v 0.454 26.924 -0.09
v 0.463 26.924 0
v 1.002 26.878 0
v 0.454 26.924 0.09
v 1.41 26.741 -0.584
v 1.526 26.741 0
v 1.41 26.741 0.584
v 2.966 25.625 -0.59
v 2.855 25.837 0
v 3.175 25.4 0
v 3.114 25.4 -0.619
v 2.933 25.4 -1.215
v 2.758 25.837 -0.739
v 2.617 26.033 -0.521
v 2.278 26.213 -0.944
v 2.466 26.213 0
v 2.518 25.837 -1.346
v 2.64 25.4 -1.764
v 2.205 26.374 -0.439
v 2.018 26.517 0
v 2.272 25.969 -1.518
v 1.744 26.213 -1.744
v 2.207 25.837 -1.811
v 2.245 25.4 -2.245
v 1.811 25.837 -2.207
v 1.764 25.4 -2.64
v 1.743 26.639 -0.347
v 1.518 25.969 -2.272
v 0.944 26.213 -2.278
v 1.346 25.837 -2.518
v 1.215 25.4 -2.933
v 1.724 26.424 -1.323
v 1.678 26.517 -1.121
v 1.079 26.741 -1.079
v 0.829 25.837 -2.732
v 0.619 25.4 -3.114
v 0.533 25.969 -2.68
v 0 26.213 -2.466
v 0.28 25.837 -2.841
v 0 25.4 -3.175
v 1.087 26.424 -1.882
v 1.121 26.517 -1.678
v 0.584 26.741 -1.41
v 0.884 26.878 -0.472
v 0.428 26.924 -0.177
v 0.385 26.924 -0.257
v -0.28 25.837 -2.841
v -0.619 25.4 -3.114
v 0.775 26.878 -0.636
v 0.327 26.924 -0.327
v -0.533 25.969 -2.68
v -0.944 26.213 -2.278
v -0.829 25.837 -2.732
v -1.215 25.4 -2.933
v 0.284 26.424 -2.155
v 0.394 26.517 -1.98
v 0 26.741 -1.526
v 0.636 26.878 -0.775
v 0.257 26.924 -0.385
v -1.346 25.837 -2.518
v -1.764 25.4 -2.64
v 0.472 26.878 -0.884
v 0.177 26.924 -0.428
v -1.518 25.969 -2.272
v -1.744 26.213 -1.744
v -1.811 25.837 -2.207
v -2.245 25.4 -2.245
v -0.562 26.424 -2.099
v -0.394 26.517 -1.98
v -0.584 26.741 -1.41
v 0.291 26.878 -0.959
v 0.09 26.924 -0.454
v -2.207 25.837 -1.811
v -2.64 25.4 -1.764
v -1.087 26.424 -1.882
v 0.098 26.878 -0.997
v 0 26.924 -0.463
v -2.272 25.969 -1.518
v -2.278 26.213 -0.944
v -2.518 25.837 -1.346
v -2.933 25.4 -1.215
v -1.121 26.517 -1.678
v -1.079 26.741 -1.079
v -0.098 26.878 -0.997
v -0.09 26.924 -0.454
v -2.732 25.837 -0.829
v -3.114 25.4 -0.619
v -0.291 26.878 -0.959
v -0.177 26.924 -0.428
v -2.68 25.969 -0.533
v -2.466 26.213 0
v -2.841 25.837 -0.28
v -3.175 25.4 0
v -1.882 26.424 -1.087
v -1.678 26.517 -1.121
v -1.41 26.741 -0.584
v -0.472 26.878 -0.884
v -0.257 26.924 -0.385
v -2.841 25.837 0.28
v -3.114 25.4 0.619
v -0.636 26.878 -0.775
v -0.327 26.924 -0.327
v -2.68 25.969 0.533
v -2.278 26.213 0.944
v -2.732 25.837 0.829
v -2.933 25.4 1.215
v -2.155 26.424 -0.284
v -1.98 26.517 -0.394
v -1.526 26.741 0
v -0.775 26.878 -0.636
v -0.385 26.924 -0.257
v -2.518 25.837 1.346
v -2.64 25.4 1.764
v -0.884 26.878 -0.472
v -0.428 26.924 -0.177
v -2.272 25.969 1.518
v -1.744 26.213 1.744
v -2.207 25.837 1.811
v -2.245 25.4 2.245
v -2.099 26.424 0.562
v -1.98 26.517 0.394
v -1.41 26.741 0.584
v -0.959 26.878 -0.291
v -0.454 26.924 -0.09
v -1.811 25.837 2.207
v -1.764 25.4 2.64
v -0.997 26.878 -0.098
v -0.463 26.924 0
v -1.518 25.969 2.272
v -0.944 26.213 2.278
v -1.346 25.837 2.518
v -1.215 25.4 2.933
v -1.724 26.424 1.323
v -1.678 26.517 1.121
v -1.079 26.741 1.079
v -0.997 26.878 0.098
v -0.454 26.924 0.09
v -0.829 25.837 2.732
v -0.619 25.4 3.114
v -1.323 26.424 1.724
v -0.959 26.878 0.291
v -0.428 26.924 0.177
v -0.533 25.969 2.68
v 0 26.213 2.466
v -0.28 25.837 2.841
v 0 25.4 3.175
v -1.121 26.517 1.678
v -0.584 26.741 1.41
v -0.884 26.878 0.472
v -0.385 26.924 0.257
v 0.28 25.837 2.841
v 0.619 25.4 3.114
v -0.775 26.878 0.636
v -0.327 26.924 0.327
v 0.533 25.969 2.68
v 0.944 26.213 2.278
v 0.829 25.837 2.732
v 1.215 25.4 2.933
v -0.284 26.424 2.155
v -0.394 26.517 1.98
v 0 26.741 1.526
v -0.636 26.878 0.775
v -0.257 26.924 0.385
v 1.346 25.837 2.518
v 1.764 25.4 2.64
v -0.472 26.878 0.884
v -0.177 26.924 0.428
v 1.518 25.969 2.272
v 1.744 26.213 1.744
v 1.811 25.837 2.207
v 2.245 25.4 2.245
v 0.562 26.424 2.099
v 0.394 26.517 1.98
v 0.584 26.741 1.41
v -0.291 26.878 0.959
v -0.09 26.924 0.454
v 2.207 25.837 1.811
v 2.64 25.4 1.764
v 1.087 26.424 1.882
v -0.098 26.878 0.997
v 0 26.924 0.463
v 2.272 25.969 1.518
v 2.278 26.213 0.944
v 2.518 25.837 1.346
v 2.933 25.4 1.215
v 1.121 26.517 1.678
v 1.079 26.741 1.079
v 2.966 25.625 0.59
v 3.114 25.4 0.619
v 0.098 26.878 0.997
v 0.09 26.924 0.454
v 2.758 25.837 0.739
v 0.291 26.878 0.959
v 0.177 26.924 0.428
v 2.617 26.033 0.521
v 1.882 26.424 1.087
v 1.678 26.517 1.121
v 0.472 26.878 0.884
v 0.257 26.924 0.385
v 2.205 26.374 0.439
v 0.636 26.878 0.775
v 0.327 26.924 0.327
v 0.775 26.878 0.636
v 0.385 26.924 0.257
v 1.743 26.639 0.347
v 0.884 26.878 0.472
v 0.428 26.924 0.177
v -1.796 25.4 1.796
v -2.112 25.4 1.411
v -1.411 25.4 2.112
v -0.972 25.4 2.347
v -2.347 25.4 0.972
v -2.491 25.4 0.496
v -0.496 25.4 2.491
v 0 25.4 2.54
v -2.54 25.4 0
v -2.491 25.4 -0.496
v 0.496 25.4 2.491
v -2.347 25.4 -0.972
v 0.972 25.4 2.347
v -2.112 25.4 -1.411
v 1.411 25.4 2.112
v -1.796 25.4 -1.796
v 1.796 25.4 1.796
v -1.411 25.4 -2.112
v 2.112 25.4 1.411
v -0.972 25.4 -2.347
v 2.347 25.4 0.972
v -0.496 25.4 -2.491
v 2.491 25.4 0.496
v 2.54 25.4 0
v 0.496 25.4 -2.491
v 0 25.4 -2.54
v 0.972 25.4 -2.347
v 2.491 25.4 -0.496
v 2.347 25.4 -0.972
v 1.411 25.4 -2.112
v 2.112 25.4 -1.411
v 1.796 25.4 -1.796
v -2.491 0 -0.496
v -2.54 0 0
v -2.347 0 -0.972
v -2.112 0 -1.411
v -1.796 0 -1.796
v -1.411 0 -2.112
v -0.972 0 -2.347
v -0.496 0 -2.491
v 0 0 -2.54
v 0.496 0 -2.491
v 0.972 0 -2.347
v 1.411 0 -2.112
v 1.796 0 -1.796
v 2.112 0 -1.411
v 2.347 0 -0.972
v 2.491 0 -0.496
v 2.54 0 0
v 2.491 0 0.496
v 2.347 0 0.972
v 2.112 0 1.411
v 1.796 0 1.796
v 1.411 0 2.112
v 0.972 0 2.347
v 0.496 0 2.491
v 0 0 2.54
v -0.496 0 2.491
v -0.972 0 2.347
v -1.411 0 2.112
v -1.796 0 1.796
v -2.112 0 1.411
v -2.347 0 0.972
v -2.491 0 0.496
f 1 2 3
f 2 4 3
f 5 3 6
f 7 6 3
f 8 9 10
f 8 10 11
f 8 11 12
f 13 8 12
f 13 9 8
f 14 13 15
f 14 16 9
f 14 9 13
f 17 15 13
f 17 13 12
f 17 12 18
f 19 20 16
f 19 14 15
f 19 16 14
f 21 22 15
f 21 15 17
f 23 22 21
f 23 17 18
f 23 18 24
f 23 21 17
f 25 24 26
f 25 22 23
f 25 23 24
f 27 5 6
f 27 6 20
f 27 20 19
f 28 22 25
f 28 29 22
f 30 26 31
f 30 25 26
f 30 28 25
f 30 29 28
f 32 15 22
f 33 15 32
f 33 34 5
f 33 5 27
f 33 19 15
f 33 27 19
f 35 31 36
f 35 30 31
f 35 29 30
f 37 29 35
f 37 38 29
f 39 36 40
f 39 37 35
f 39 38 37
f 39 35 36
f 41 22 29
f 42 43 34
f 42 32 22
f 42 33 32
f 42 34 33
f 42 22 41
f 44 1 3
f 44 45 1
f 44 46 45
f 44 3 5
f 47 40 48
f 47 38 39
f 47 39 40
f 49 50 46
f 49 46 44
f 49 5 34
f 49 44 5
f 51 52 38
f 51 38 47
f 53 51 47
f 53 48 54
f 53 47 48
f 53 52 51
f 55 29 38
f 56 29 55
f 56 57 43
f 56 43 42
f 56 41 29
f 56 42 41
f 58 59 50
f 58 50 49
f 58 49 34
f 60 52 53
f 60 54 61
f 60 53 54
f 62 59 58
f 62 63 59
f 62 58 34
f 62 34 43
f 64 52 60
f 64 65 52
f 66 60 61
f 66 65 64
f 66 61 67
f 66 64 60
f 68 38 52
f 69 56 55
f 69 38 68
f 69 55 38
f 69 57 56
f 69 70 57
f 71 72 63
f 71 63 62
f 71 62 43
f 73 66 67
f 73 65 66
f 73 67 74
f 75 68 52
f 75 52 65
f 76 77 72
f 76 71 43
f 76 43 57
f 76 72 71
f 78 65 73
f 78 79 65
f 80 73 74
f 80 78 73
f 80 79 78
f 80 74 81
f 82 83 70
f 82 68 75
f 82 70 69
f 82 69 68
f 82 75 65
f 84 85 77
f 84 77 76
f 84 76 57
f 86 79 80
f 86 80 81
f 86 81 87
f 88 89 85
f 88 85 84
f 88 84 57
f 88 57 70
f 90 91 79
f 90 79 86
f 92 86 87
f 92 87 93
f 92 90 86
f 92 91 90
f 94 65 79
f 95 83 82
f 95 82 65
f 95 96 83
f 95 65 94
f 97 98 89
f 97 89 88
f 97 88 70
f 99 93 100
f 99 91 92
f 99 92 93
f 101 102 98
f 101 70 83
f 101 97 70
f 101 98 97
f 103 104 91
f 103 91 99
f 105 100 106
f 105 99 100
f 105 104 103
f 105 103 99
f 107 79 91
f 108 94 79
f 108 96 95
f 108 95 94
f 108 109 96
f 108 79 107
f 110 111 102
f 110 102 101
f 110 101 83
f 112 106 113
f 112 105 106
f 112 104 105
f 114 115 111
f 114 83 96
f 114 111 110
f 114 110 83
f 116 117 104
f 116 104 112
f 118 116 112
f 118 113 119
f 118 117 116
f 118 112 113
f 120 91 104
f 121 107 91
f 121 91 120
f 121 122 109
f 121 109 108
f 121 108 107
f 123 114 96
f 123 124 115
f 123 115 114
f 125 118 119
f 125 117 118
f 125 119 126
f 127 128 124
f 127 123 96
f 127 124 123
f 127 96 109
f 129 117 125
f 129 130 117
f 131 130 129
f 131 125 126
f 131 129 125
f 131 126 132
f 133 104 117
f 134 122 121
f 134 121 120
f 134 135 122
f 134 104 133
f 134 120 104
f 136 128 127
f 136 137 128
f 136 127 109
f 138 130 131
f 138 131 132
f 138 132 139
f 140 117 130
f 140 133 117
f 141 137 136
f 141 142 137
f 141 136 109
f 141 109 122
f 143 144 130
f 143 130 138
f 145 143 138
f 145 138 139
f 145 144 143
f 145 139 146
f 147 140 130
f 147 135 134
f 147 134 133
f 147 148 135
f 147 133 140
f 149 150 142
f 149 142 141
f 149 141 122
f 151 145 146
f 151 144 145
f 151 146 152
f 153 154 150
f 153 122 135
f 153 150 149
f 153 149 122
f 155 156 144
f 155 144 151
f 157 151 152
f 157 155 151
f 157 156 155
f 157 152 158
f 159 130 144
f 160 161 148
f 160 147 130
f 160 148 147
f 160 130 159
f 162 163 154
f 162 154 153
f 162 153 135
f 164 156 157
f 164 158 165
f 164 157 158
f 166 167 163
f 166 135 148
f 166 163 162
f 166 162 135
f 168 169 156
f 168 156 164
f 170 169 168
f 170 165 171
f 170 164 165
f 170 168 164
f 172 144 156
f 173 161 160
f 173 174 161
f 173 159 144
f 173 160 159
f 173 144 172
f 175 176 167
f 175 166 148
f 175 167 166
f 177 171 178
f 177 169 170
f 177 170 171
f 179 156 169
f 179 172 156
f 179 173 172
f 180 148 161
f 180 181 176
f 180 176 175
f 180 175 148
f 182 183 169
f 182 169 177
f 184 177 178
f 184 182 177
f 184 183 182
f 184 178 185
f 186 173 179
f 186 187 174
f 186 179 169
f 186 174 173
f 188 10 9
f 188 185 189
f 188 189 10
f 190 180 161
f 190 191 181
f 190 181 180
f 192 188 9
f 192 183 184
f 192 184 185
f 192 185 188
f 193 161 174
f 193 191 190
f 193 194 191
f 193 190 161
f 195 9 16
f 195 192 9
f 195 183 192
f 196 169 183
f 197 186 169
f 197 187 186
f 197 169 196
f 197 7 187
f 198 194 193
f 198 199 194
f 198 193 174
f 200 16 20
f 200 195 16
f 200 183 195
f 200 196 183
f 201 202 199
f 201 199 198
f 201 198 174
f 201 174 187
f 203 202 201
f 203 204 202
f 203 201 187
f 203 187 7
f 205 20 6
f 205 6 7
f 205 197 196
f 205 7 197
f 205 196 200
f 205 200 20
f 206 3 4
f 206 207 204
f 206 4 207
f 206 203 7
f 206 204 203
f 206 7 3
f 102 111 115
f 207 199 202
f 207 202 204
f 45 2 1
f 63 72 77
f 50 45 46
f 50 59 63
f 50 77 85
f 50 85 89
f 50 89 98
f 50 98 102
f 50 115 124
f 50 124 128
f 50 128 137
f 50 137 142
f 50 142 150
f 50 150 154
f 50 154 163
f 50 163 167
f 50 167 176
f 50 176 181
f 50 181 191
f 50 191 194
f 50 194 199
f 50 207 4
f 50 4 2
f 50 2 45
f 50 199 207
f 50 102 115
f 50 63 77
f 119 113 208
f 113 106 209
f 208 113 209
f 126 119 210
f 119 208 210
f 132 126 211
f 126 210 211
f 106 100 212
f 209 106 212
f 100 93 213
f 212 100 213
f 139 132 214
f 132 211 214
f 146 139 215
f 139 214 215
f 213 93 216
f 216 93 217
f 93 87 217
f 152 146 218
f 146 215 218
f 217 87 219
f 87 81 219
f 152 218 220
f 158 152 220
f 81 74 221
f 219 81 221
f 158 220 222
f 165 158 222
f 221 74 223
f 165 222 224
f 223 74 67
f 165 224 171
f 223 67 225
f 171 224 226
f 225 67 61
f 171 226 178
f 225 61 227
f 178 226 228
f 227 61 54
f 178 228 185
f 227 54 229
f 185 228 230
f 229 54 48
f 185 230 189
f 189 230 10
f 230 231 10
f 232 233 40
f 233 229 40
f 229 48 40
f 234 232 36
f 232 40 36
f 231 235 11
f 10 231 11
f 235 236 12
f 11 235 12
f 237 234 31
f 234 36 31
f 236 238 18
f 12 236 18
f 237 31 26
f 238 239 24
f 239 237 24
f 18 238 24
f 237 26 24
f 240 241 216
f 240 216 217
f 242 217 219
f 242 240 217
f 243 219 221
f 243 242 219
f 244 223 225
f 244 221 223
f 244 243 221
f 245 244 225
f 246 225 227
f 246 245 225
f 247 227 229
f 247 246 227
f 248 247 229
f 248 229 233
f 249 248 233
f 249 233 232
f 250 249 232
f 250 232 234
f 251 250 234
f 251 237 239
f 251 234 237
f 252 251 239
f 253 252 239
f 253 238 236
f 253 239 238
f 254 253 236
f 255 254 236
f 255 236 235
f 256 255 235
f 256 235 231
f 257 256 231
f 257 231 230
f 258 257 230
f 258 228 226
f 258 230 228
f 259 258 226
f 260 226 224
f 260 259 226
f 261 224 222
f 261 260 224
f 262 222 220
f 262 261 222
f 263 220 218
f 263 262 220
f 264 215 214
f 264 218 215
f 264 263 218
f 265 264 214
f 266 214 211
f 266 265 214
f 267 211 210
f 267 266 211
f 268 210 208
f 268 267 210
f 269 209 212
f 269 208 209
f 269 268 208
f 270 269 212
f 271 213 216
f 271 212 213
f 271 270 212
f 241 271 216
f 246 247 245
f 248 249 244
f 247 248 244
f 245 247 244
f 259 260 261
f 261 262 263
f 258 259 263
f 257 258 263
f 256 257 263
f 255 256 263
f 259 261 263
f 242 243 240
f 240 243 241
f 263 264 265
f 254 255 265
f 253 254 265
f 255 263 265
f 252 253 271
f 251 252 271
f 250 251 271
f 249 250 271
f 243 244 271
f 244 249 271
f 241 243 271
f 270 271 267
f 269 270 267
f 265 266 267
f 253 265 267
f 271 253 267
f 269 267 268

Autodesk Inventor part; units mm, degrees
ref_plane "YZ Plane" through (0, 0, 0) normal (1, 0, 0) x (0, 1, 0)
ref_plane "XZ Plane" through (0, 0, 0) normal (0, 1, 0) x (-1, 0, 0)
ref_plane "XY Plane" through (0, 0, 0) normal (0, 0, 1) x (1, 0, 0)
sketch "Sketch1" plane through (0, 0, 0) normal (0, 1, 0) x (-1, 0, 0)
  point P0 (0, 0)
sketch "Sketch2" plane through (0, 0, 0) normal (0, 1, 0) x (-1, 0, 0)
  point P0 (0, 0)
sketch "Sketch3" plane through (0, 0, 0) normal (0, 1, 0) x (-1, 0, 0)
  circle A0 centre (0, 0) radius 2.54
  dimension "d0" = 5.08
extrude "Extrusion1" add sketch "Sketch3" along normal blind 25.4
thread "Thread1" size "12-24 UNC" class "2A" standard "ANSI Unified Screw Threads" full length
sketch "Sketch4" plane through (0, 25.4, 0) normal (0, 1, 0) x (1, 0, 0)
  circle A0 centre (0, 0) radius 3.175
  dimension "d5" = 6.35
extrude "Extrusion2" add sketch "Sketch4" along normal blind 1.524
fillet "Fillet1" radius 3.175 1 edges at (-3.175, 26.924, 0)
properties part number "1inchscrew"
